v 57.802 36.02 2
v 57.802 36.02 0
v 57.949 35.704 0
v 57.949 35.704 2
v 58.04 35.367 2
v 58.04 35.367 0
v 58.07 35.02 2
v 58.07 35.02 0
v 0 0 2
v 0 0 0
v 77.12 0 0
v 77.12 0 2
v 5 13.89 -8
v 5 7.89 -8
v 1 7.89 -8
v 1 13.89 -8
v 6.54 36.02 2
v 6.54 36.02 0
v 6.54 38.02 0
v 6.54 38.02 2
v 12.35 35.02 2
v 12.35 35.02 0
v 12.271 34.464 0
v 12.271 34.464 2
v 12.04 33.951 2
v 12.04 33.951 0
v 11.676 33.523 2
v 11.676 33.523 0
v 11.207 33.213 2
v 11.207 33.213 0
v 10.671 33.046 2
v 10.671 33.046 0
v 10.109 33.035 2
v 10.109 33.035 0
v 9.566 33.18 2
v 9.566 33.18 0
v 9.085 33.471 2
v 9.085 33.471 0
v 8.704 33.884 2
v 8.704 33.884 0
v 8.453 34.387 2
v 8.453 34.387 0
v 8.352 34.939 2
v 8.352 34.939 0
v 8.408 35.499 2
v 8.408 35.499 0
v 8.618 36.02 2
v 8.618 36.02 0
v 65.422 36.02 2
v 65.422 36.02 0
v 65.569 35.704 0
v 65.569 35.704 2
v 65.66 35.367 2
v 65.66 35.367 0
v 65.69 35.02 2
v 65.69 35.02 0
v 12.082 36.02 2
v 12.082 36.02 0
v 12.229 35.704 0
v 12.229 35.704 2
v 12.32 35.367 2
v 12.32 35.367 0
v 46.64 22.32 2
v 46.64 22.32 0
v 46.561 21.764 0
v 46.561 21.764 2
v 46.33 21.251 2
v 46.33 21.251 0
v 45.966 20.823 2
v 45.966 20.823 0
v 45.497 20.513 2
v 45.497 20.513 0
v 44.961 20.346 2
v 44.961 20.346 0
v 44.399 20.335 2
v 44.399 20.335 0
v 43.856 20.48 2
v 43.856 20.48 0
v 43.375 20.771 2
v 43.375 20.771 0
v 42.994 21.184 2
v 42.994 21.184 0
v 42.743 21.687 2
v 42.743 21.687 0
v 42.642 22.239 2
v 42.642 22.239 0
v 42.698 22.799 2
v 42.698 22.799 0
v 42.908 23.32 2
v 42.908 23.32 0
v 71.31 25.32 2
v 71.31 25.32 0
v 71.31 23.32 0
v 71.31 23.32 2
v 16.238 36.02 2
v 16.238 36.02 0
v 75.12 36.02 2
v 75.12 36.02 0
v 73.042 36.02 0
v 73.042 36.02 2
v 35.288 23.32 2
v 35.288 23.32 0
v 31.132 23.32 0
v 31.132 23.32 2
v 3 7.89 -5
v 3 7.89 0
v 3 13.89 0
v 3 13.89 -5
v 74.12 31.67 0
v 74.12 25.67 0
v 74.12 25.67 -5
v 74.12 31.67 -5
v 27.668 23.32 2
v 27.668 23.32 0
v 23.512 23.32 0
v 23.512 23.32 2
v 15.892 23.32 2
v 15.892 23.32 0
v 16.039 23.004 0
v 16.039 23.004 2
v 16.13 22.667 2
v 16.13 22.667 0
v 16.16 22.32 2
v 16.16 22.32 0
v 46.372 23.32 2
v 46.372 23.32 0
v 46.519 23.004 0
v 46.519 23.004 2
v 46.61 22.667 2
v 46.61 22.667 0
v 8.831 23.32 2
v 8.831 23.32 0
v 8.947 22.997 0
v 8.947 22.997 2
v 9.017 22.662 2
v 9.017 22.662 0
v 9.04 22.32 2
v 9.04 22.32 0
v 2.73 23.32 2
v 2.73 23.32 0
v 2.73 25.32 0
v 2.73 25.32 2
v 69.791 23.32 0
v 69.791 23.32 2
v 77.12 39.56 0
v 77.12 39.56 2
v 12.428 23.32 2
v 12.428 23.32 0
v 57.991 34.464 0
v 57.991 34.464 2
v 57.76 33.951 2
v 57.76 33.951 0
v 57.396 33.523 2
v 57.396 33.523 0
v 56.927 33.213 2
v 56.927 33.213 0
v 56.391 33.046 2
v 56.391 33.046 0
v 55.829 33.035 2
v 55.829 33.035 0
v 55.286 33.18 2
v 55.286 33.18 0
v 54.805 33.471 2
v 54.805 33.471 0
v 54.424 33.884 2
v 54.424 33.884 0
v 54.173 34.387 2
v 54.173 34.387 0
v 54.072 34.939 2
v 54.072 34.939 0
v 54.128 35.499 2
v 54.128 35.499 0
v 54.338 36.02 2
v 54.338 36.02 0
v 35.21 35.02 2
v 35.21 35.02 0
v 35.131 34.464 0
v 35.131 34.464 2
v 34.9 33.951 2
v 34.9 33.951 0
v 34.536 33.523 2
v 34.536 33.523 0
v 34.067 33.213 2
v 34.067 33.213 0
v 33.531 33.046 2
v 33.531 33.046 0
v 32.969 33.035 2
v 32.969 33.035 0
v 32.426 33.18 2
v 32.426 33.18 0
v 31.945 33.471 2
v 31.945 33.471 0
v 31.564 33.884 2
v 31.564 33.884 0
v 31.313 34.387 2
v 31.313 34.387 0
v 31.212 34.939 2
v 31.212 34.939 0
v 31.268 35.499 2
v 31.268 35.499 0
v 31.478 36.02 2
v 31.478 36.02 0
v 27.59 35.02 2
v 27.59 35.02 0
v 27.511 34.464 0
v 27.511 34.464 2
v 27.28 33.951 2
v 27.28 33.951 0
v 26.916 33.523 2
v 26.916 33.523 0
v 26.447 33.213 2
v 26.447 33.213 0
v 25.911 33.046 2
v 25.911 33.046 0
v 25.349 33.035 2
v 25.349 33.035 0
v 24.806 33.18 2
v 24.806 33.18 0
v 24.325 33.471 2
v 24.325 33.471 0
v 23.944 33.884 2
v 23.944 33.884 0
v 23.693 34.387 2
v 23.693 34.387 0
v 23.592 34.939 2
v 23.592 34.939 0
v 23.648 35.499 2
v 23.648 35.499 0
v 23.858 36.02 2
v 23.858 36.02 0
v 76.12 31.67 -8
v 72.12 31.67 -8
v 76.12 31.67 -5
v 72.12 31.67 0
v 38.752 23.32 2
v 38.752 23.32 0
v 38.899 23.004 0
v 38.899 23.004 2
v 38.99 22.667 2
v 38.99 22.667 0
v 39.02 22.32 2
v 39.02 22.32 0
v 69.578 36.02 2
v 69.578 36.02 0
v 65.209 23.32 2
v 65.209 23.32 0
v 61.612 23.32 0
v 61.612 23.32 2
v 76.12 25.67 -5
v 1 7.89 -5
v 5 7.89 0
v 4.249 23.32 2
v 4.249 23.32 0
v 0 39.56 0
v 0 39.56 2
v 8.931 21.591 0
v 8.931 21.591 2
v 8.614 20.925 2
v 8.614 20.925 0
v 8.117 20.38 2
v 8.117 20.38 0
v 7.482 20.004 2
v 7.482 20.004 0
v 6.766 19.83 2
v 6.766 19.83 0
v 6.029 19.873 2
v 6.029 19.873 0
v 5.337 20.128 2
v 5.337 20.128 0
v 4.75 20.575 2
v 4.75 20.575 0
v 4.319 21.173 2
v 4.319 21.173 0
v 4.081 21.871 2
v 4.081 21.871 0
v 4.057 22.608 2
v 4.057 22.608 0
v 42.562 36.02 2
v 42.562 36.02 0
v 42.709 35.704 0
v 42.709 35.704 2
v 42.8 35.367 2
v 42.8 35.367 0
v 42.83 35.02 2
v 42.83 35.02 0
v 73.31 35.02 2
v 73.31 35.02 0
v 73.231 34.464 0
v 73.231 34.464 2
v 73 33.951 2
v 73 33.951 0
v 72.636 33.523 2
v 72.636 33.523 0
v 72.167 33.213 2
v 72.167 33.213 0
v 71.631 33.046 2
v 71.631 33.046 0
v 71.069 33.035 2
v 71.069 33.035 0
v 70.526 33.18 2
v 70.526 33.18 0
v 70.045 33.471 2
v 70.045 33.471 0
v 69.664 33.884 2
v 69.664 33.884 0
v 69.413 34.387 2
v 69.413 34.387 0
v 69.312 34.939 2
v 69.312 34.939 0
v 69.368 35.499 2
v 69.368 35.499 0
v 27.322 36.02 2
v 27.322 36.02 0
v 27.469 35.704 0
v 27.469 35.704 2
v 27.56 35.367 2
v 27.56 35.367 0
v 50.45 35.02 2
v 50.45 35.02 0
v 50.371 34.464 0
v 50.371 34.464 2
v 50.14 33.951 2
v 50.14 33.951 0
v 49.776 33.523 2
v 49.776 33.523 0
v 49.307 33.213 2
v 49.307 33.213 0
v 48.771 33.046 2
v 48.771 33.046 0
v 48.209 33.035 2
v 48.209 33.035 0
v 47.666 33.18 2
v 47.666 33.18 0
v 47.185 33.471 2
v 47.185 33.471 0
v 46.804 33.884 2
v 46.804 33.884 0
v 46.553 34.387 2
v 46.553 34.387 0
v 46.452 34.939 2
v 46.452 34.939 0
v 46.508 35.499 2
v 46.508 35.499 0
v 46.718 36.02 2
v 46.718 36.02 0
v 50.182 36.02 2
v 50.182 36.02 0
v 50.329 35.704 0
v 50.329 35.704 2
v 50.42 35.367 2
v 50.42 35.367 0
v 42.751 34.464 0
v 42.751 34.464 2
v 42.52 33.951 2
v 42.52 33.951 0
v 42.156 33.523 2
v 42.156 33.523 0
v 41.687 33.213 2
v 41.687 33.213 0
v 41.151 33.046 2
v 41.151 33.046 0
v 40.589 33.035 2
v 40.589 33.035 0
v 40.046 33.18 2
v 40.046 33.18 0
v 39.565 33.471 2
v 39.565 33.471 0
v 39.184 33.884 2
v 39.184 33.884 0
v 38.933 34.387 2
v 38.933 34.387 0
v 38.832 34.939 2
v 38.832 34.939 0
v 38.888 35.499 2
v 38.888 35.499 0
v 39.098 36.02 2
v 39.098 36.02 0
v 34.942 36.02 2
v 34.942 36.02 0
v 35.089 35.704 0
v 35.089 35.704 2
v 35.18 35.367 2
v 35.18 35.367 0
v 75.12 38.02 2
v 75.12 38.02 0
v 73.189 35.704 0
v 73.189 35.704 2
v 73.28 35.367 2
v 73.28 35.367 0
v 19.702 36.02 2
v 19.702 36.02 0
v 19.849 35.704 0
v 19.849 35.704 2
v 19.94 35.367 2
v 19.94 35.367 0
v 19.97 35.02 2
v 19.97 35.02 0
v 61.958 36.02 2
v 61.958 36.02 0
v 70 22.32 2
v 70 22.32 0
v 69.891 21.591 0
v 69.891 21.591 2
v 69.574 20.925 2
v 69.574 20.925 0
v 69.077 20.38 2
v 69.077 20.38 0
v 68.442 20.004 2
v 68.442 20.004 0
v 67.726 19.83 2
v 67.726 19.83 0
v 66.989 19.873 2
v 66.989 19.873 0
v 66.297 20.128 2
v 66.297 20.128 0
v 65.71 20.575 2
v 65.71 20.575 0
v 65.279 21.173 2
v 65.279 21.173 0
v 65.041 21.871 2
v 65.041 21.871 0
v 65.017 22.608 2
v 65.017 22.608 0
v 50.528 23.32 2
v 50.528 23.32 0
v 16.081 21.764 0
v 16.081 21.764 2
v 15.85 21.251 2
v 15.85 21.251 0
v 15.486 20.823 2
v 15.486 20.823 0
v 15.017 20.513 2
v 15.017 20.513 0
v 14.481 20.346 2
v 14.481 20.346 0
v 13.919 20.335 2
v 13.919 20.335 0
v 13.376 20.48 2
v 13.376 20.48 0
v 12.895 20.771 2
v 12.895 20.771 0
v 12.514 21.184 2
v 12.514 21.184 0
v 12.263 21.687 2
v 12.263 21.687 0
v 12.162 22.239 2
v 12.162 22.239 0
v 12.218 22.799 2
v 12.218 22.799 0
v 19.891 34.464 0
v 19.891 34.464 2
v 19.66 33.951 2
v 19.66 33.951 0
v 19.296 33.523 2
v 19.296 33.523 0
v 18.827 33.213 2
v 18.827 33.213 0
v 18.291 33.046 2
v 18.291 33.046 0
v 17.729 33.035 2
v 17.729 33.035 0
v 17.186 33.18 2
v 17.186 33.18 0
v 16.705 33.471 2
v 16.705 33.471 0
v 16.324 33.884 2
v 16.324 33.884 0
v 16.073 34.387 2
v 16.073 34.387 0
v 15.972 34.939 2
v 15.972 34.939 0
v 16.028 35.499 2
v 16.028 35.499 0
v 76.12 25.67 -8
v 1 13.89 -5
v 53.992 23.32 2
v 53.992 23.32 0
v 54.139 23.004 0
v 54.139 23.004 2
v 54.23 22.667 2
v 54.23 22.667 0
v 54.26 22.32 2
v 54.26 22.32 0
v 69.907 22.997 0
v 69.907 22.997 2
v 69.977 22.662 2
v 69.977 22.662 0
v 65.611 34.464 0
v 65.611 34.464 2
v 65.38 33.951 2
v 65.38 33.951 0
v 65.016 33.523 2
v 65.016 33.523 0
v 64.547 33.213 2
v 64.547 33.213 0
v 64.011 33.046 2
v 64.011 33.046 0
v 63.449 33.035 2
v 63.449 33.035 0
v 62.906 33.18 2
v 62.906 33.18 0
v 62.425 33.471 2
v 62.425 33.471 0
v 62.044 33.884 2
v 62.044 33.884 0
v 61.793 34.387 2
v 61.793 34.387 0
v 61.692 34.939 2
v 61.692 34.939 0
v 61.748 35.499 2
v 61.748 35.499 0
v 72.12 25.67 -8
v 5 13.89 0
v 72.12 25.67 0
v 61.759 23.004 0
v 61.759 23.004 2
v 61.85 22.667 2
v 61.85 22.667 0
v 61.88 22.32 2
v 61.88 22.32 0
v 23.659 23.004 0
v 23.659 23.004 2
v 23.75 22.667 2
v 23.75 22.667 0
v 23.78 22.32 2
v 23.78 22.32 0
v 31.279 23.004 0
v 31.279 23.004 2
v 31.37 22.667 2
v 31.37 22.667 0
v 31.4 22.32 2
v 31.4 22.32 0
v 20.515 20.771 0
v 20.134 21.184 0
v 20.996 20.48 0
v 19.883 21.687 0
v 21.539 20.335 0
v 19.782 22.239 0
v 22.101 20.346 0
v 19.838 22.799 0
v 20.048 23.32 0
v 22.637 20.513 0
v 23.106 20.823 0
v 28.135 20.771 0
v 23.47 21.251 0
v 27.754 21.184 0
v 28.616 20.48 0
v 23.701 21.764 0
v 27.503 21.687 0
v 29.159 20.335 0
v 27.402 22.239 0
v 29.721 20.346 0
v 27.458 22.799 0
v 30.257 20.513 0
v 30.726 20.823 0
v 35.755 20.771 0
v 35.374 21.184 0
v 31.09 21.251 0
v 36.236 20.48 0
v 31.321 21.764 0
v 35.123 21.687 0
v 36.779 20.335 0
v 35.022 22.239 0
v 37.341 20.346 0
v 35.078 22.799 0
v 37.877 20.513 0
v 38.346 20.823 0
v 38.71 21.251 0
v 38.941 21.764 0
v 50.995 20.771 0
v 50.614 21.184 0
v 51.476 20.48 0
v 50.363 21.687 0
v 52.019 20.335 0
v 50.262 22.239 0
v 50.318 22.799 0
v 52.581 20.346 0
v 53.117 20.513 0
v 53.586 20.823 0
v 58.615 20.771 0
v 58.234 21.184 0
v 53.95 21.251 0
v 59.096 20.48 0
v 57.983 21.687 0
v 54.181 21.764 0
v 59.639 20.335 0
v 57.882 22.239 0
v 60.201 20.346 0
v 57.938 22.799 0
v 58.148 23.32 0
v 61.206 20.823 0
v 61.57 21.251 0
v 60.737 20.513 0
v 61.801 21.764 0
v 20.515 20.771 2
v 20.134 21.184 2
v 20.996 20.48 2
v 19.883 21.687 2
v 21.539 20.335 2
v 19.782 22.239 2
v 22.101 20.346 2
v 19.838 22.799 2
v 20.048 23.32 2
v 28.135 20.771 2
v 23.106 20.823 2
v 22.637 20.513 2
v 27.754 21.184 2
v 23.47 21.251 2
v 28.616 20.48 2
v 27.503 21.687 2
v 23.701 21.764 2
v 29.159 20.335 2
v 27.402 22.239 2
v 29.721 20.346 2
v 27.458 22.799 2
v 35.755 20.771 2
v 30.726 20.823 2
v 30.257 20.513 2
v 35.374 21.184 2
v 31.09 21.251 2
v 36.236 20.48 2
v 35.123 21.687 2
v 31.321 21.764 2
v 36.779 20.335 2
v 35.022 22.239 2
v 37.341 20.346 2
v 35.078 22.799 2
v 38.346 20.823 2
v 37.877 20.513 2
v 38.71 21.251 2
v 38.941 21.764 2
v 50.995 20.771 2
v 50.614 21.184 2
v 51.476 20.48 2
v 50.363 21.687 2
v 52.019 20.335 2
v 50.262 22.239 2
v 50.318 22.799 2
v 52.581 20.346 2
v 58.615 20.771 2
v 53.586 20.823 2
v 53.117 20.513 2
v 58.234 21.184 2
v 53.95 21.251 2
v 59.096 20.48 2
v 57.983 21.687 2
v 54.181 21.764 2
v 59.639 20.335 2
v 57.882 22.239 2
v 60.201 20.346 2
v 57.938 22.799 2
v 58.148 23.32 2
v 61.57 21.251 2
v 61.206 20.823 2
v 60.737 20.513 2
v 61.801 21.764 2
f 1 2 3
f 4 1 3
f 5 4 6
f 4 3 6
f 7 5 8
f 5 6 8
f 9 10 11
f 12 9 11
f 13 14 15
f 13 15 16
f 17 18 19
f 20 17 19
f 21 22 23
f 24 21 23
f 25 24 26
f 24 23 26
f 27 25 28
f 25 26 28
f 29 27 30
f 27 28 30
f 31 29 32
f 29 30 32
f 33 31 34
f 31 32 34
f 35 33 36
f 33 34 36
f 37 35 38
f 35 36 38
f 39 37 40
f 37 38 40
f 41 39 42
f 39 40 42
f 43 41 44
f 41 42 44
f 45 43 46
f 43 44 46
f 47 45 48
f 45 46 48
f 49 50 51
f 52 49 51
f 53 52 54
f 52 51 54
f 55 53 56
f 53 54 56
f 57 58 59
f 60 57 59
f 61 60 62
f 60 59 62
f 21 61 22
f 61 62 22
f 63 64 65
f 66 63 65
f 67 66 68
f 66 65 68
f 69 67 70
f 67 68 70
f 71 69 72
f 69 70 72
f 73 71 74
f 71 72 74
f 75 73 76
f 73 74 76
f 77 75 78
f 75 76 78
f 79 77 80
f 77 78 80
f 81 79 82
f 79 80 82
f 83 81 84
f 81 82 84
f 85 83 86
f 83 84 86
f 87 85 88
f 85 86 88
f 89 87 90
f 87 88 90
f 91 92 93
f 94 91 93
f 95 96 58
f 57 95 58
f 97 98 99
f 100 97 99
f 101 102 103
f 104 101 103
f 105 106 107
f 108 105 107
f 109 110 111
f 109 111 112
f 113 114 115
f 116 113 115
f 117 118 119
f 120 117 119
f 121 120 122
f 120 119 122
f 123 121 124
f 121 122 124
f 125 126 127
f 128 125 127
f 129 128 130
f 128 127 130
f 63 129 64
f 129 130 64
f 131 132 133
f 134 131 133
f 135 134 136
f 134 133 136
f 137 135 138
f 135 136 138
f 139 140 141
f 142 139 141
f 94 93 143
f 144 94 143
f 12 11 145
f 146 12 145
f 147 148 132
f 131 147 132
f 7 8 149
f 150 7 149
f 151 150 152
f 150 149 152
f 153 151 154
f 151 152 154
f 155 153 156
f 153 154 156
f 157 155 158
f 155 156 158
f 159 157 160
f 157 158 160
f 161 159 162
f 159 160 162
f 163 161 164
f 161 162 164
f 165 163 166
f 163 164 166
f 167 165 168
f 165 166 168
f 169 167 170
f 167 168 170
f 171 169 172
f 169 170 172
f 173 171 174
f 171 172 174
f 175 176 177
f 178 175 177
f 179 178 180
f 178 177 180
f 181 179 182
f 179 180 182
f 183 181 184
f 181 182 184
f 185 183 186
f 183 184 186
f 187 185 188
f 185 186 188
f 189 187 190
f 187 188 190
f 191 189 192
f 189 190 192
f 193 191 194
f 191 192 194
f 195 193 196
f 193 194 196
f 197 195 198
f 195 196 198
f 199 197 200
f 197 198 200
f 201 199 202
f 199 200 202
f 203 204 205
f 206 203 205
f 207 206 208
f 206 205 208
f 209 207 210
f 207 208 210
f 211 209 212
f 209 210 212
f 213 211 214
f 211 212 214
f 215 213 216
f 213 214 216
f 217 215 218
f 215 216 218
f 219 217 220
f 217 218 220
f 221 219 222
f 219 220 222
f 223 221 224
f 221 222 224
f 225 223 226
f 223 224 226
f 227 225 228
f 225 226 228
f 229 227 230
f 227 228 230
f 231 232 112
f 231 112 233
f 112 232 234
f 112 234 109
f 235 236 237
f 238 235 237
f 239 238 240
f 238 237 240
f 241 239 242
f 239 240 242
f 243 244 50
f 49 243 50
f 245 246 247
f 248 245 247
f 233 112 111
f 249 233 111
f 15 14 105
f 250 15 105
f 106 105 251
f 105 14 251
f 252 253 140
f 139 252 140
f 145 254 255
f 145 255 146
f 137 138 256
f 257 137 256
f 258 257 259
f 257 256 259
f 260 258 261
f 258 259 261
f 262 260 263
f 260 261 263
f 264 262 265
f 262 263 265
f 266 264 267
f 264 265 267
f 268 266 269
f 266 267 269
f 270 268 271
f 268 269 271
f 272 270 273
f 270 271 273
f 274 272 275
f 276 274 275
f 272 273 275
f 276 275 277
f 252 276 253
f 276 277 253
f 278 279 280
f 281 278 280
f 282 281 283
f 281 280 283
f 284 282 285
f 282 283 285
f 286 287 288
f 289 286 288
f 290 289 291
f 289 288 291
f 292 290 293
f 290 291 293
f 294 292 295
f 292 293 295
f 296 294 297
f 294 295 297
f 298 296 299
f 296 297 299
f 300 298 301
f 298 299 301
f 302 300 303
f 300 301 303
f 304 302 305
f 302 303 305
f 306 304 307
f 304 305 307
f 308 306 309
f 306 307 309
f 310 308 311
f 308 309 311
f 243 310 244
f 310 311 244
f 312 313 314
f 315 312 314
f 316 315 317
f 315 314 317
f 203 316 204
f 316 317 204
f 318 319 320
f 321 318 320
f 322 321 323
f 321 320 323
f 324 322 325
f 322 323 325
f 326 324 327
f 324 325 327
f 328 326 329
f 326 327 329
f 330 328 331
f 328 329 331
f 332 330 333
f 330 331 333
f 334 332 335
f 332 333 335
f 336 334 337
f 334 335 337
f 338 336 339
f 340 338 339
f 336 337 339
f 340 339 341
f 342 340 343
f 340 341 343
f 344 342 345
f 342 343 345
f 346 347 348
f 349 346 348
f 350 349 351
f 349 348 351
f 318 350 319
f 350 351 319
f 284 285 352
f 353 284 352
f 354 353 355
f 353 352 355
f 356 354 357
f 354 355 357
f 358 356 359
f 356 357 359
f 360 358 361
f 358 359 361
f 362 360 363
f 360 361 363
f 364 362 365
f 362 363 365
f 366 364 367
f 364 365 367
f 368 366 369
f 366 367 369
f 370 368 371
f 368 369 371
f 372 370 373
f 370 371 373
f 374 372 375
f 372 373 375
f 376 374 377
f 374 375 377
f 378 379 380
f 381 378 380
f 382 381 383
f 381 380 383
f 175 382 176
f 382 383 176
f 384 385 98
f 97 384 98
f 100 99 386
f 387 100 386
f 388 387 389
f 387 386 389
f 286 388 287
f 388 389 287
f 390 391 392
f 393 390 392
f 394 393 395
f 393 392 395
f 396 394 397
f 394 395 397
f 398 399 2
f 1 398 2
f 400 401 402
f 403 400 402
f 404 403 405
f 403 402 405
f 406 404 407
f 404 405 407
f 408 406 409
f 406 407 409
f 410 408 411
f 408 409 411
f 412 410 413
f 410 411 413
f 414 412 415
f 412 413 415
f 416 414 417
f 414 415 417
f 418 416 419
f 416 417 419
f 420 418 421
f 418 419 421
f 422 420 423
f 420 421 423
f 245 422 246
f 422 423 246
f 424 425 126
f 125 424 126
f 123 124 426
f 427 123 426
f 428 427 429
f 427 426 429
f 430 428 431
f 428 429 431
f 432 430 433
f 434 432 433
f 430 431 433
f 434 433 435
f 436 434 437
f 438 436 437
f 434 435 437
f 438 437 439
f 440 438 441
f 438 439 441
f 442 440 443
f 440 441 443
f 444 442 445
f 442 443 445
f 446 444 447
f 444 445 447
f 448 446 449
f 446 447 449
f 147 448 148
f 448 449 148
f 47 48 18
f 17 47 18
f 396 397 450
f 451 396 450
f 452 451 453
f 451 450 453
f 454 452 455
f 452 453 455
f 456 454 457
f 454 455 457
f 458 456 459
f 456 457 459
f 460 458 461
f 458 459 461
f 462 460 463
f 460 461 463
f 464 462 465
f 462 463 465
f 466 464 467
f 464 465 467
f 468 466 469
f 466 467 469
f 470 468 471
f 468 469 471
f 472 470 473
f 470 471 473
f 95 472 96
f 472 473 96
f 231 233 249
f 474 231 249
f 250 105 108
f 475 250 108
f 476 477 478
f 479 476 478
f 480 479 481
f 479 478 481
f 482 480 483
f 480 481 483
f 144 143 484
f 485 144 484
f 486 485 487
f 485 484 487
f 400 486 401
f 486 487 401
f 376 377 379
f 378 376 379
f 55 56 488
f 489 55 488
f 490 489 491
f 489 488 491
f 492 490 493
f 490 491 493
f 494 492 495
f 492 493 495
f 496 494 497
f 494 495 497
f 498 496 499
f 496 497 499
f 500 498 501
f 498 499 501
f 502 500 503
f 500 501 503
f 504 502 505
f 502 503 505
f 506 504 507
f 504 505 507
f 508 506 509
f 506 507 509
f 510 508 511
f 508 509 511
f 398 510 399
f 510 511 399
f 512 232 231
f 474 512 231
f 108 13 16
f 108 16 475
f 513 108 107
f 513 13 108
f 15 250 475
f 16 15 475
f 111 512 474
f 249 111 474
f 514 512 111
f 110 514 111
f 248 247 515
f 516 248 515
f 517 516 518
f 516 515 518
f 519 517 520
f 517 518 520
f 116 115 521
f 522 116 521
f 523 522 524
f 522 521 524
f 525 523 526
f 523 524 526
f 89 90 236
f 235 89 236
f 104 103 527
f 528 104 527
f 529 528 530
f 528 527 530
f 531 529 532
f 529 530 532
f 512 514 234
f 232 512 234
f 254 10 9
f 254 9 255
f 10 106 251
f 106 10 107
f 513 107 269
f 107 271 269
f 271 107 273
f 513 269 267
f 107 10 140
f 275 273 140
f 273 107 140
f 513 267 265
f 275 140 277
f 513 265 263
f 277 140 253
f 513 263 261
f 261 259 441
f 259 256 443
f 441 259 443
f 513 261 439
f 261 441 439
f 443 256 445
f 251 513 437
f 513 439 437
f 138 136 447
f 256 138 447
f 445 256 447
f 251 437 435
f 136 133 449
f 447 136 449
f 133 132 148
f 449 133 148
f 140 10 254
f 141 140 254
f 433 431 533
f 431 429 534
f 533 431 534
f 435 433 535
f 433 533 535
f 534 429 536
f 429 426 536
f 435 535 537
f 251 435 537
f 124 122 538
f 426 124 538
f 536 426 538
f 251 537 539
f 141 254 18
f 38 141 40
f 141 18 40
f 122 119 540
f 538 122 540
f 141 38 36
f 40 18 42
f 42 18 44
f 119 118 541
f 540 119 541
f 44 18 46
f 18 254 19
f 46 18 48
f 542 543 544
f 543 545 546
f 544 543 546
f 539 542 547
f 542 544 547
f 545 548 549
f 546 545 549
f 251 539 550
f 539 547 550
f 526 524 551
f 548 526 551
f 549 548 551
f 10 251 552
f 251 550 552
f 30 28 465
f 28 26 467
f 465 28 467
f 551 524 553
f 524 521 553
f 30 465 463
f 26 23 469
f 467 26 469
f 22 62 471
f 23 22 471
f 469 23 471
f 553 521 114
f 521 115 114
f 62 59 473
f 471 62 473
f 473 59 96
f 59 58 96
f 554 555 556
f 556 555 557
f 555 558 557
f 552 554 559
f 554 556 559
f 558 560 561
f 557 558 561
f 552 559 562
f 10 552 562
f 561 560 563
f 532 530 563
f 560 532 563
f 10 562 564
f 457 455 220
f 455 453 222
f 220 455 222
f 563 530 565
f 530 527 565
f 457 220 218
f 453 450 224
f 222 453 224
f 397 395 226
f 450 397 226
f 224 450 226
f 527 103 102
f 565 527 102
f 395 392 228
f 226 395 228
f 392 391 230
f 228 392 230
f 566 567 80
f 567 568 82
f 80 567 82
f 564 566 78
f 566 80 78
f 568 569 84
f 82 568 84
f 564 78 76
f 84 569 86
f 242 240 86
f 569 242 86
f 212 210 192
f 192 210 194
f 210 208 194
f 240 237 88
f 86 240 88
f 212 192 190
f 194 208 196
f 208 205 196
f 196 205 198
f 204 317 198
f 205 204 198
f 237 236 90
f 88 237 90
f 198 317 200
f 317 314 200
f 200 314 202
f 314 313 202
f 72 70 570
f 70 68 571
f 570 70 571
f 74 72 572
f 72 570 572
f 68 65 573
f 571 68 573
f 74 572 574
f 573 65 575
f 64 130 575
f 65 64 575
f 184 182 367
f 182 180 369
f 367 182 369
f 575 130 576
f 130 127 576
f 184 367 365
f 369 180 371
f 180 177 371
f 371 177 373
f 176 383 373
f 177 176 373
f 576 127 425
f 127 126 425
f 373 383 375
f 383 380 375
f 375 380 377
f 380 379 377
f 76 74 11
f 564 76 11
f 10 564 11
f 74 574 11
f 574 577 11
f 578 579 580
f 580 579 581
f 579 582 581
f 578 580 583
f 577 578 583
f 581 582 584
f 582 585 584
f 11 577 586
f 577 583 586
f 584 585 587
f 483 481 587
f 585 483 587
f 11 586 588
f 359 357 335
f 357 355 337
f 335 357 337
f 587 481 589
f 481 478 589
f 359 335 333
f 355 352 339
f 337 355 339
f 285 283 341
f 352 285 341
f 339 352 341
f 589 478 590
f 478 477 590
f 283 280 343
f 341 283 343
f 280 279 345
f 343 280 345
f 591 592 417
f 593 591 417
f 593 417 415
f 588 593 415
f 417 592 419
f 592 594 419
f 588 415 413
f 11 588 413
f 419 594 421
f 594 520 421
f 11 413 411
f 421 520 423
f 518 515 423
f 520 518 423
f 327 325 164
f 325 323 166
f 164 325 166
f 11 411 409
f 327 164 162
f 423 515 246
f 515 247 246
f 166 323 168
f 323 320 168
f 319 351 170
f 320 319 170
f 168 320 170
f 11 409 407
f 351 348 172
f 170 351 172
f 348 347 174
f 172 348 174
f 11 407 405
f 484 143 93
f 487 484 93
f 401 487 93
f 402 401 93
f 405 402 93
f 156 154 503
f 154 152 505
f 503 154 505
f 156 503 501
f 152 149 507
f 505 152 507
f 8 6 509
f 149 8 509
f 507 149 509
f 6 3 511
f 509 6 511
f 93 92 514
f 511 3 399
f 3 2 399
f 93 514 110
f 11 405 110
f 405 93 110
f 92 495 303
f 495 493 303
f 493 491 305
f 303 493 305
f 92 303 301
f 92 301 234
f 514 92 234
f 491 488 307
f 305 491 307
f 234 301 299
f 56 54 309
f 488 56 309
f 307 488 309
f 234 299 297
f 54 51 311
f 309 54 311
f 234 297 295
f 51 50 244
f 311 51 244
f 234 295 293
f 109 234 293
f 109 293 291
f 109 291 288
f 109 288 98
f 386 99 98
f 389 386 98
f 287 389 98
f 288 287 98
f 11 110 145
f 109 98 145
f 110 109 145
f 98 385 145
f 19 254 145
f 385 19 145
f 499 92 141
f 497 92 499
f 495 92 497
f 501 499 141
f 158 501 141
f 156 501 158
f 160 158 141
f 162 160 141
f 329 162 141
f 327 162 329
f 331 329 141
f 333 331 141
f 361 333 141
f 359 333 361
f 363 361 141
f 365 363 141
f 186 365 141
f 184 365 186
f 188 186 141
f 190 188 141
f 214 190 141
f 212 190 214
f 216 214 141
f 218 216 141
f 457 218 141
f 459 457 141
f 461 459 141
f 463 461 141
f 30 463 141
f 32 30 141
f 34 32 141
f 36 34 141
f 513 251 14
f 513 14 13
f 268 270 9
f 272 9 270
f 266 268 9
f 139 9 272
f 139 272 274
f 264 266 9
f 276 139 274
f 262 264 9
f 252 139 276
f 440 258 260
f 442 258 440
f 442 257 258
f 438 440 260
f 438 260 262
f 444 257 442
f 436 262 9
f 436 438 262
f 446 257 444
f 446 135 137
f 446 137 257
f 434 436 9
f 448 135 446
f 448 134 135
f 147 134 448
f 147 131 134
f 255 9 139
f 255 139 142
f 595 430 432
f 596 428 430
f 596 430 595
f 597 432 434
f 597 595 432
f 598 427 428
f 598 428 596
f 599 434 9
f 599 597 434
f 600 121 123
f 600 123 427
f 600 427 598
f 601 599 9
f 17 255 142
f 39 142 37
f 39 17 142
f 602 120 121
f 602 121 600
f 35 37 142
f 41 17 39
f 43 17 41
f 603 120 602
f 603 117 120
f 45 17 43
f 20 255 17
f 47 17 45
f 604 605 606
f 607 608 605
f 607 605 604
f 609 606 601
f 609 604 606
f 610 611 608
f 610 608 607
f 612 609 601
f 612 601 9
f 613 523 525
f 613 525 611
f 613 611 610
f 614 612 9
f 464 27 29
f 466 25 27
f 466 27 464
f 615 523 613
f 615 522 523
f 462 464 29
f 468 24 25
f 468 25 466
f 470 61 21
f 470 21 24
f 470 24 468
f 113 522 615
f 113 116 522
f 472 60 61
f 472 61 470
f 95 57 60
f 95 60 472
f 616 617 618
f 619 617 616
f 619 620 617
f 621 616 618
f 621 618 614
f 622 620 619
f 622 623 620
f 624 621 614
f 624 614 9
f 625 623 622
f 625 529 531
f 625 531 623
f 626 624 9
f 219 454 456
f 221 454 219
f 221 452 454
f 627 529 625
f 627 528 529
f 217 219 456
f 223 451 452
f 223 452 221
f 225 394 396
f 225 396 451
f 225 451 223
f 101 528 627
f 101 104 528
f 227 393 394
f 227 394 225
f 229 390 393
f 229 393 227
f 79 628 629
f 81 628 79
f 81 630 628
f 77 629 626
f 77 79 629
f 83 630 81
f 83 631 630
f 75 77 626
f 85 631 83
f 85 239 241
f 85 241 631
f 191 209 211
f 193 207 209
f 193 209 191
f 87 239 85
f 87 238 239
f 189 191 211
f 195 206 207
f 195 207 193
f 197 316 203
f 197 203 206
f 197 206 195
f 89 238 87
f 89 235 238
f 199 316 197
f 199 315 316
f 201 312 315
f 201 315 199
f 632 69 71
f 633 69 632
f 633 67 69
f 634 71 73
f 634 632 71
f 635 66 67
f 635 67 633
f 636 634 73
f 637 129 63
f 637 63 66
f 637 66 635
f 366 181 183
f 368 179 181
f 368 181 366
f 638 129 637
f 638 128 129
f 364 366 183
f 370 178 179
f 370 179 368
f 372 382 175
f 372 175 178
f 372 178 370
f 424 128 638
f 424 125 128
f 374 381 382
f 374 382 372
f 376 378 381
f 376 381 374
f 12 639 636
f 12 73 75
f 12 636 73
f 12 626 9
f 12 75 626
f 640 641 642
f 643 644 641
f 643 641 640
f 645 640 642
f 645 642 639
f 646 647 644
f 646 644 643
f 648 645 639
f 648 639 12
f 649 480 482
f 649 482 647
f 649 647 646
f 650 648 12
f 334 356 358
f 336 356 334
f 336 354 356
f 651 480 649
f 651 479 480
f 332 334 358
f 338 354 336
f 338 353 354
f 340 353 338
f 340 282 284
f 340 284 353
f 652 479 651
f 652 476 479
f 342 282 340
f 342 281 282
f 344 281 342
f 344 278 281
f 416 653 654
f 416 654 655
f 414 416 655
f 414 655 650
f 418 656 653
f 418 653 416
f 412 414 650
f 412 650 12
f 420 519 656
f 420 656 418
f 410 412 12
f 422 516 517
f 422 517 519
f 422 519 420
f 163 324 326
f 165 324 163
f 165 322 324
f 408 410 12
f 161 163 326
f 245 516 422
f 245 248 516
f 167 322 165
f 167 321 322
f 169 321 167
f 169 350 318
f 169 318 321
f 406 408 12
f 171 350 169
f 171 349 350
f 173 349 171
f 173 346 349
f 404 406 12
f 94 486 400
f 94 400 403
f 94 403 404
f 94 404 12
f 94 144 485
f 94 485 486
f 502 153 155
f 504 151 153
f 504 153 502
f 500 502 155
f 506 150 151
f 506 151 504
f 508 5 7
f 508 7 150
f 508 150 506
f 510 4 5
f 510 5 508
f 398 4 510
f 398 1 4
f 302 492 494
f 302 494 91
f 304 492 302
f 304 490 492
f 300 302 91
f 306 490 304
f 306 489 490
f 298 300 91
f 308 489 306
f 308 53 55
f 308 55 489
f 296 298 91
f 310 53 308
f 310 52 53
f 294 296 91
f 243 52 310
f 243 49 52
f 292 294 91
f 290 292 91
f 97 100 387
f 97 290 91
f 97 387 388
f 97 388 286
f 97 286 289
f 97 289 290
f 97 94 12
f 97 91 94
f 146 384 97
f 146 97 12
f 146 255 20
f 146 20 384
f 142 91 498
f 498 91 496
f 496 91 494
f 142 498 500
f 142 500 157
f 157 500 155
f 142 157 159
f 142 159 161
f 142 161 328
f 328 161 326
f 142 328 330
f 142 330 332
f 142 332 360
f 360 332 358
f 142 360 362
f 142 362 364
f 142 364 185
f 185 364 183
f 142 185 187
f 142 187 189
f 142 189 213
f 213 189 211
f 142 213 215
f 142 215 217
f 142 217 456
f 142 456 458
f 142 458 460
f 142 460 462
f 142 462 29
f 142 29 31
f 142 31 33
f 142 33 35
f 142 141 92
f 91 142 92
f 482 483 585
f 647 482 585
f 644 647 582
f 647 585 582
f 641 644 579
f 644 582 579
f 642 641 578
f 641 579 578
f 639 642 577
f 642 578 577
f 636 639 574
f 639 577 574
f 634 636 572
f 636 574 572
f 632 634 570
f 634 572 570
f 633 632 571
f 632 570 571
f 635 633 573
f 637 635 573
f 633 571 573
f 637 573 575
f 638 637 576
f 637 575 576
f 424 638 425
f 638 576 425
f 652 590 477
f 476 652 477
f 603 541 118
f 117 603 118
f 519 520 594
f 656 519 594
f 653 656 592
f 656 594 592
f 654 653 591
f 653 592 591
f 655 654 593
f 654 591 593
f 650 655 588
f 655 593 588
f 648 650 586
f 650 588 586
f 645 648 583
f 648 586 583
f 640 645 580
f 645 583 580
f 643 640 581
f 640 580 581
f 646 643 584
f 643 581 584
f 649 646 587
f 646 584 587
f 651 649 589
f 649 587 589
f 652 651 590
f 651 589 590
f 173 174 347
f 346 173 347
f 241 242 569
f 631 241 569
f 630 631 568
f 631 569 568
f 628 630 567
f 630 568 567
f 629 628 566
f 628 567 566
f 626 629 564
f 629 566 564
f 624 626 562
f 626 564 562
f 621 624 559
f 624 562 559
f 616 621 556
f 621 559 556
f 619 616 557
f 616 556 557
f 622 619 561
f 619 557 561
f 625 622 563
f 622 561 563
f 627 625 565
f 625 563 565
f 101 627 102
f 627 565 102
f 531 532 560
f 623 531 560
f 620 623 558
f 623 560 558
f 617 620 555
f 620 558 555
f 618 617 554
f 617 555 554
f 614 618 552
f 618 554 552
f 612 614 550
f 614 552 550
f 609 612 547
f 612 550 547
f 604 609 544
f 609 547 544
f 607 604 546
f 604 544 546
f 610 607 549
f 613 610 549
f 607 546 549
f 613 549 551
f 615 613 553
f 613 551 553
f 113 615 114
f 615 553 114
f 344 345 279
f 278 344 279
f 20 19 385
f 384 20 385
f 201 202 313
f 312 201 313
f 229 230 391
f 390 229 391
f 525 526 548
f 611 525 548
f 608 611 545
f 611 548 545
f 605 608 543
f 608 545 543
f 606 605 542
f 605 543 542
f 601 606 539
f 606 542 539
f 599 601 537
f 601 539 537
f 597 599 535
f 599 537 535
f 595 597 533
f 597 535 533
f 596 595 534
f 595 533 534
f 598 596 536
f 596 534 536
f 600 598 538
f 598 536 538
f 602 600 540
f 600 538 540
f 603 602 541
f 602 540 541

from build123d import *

# Parameters (mm, degrees)
F0_W          = 77.12
F0_H          = 39.56
F0_W_2        = 2
F0_H_2        = 6
F1_DEPTH      = 2
F2_DEPTH      = 8
F2_DEPTH_BACK = -2
F3_DEPTH      = 8
F3_DEPTH_BACK = -2
F4_W          = 6
F4_H          = 3
F5_DEPTH      = 4
F6_W          = 6
F6_H          = 3
F7_DEPTH      = 4


with BuildPart() as f1:
    # F0 (on Top) → F1 (new body)
    with BuildSketch(Plane.XY):
        with Locations((38.56, 19.78)):
            Rectangle(F0_W, F0_H)
        with Locations((4, 10.89)):
            Rectangle(F0_W_2, F0_H_2, mode=Mode.SUBTRACT)
        with BuildLine():
            ThreePointArc((15.892051, 23.32), (16.091852, 22.837638), (16.16, 22.32))
            ThreePointArc((16.16, 22.32), (13.642362, 20.388148), (12.427949, 23.32))
            Line((12.427949, 23.32), (8.831288, 23.32))
            ThreePointArc((8.831288, 23.32), (8.987266, 22.830774), (9.04, 22.32))
            ThreePointArc((9.04, 22.32), (6.029226, 19.872734), (4.248712, 23.32))
            Line((4.248712, 23.32), (2.73, 23.32))
            Line((2.73, 23.32), (2.73, 25.32))
            Line((2.73, 25.32), (71.31, 25.32))
            Line((71.31, 25.32), (71.31, 23.32))
            Line((71.31, 23.32), (69.791288, 23.32))
            ThreePointArc((69.791288, 23.32), (69.947266, 22.830774), (70, 22.32))
            ThreePointArc((70, 22.32), (66.989226, 19.872734), (65.208712, 23.32))
            Line((65.208712, 23.32), (61.612051, 23.32))
            ThreePointArc((61.612051, 23.32), (61.811852, 22.837638), (61.88, 22.32))
            ThreePointArc((61.88, 22.32), (59.362362, 20.388148), (58.147949, 23.32))
            Line((58.147949, 23.32), (53.992051, 23.32))
            ThreePointArc((53.992051, 23.32), (54.191852, 22.837638), (54.26, 22.32))
            ThreePointArc((54.26, 22.32), (51.742362, 20.388148), (50.527949, 23.32))
            Line((50.527949, 23.32), (46.372051, 23.32))
            ThreePointArc((46.372051, 23.32), (46.571852, 22.837638), (46.64, 22.32))
            ThreePointArc((46.64, 22.32), (44.122362, 20.388148), (42.907949, 23.32))
            Line((42.907949, 23.32), (38.752051, 23.32))
            ThreePointArc((38.752051, 23.32), (38.951852, 22.837638), (39.02, 22.32))
            ThreePointArc((39.02, 22.32), (36.502362, 20.388148), (35.287949, 23.32))
            Line((35.287949, 23.32), (31.132051, 23.32))
            ThreePointArc((31.132051, 23.32), (31.331852, 22.837638), (31.4, 22.32))
            ThreePointArc((31.4, 22.32), (28.882362, 20.388148), (27.667949, 23.32))
            Line((27.667949, 23.32), (23.512051, 23.32))
            ThreePointArc((23.512051, 23.32), (23.711852, 22.837638), (23.78, 22.32))
            ThreePointArc((23.78, 22.32), (21.262362, 20.388148), (20.047949, 23.32))
            Line((20.047949, 23.32), (15.892051, 23.32))
        make_face(mode=Mode.SUBTRACT)
        with Locations((73.12, 28.67)):
            Rectangle(F0_W_2, F0_H_2, mode=Mode.SUBTRACT)
        with BuildLine():
            ThreePointArc((12.082051, 36.02), (12.281852, 35.537638), (12.35, 35.02))
            ThreePointArc((12.35, 35.02), (9.832362, 33.088148), (8.617949, 36.02))
            Line((8.617949, 36.02), (6.54, 36.02))
            Line((6.54, 36.02), (6.54, 38.02))
            Line((6.54, 38.02), (75.12, 38.02))
            Line((75.12, 38.02), (75.12, 36.02))
            Line((75.12, 36.02), (73.042051, 36.02))
            ThreePointArc((73.042051, 36.02), (73.241852, 35.537638), (73.31, 35.02))
            ThreePointArc((73.31, 35.02), (70.792362, 33.088148), (69.577949, 36.02))
            Line((69.577949, 36.02), (65.422051, 36.02))
            ThreePointArc((65.422051, 36.02), (65.621852, 35.537638), (65.69, 35.02))
            ThreePointArc((65.69, 35.02), (63.172362, 33.088148), (61.957949, 36.02))
            Line((61.957949, 36.02), (57.802051, 36.02))
            ThreePointArc((57.802051, 36.02), (58.001852, 35.537638), (58.07, 35.02))
            ThreePointArc((58.07, 35.02), (55.552362, 33.088148), (54.337949, 36.02))
            Line((54.337949, 36.02), (50.182051, 36.02))
            ThreePointArc((50.182051, 36.02), (50.381852, 35.537638), (50.45, 35.02))
            ThreePointArc((50.45, 35.02), (47.932362, 33.088148), (46.717949, 36.02))
            Line((46.717949, 36.02), (42.562051, 36.02))
            ThreePointArc((42.562051, 36.02), (42.761852, 35.537638), (42.83, 35.02))
            ThreePointArc((42.83, 35.02), (40.312362, 33.088148), (39.097949, 36.02))
            Line((39.097949, 36.02), (34.942051, 36.02))
            ThreePointArc((34.942051, 36.02), (35.141852, 35.537638), (35.21, 35.02))
            ThreePointArc((35.21, 35.02), (32.692362, 33.088148), (31.477949, 36.02))
            Line((31.477949, 36.02), (27.322051, 36.02))
            ThreePointArc((27.322051, 36.02), (27.521852, 35.537638), (27.59, 35.02))
            ThreePointArc((27.59, 35.02), (25.072362, 33.088148), (23.857949, 36.02))
            Line((23.857949, 36.02), (19.702051, 36.02))
            ThreePointArc((19.702051, 36.02), (19.901852, 35.537638), (19.97, 35.02))
            ThreePointArc((19.97, 35.02), (17.452362, 33.088148), (16.237949, 36.02))
            Line((16.237949, 36.02), (12.082051, 36.02))
        make_face(mode=Mode.SUBTRACT)
    extrude(amount=F1_DEPTH)

    # F0 (on Top) → F2 (join, two sides)
    with BuildSketch(Plane.XY) as f2_sk:
        with Locations((73.12, 28.67)):
            Rectangle(F0_W_2, F0_H_2)
    extrude(amount=-F2_DEPTH)
    extrude(f2_sk.sketch, amount=-F2_DEPTH_BACK)

    # F0 (on Top) → F3 (join, two sides)
    with BuildSketch(Plane.XY) as f3_sk:
        with Locations((4, 10.89)):
            Rectangle(F0_W_2, F0_H_2)
    extrude(amount=-F3_DEPTH)
    extrude(f3_sk.sketch, amount=-F3_DEPTH_BACK)

    # F4 (on face) → F5 (join)
    with BuildSketch(Plane.YZ.offset(5)):
        with Locations((10.89, -6.5)):
            Rectangle(F4_W, F4_H)
    extrude(amount=-F5_DEPTH)

    # F6 (on face) → F7 (join)
    with BuildSketch(Plane(origin=(72.12, 0, 0), x_dir=(0, -1, 0), z_dir=(-1, 0, 0))):
        with Locations((-28.67, -6.5)):
            Rectangle(F6_W, F6_H)
    extrude(amount=-F7_DEPTH)


solid = f1.part
